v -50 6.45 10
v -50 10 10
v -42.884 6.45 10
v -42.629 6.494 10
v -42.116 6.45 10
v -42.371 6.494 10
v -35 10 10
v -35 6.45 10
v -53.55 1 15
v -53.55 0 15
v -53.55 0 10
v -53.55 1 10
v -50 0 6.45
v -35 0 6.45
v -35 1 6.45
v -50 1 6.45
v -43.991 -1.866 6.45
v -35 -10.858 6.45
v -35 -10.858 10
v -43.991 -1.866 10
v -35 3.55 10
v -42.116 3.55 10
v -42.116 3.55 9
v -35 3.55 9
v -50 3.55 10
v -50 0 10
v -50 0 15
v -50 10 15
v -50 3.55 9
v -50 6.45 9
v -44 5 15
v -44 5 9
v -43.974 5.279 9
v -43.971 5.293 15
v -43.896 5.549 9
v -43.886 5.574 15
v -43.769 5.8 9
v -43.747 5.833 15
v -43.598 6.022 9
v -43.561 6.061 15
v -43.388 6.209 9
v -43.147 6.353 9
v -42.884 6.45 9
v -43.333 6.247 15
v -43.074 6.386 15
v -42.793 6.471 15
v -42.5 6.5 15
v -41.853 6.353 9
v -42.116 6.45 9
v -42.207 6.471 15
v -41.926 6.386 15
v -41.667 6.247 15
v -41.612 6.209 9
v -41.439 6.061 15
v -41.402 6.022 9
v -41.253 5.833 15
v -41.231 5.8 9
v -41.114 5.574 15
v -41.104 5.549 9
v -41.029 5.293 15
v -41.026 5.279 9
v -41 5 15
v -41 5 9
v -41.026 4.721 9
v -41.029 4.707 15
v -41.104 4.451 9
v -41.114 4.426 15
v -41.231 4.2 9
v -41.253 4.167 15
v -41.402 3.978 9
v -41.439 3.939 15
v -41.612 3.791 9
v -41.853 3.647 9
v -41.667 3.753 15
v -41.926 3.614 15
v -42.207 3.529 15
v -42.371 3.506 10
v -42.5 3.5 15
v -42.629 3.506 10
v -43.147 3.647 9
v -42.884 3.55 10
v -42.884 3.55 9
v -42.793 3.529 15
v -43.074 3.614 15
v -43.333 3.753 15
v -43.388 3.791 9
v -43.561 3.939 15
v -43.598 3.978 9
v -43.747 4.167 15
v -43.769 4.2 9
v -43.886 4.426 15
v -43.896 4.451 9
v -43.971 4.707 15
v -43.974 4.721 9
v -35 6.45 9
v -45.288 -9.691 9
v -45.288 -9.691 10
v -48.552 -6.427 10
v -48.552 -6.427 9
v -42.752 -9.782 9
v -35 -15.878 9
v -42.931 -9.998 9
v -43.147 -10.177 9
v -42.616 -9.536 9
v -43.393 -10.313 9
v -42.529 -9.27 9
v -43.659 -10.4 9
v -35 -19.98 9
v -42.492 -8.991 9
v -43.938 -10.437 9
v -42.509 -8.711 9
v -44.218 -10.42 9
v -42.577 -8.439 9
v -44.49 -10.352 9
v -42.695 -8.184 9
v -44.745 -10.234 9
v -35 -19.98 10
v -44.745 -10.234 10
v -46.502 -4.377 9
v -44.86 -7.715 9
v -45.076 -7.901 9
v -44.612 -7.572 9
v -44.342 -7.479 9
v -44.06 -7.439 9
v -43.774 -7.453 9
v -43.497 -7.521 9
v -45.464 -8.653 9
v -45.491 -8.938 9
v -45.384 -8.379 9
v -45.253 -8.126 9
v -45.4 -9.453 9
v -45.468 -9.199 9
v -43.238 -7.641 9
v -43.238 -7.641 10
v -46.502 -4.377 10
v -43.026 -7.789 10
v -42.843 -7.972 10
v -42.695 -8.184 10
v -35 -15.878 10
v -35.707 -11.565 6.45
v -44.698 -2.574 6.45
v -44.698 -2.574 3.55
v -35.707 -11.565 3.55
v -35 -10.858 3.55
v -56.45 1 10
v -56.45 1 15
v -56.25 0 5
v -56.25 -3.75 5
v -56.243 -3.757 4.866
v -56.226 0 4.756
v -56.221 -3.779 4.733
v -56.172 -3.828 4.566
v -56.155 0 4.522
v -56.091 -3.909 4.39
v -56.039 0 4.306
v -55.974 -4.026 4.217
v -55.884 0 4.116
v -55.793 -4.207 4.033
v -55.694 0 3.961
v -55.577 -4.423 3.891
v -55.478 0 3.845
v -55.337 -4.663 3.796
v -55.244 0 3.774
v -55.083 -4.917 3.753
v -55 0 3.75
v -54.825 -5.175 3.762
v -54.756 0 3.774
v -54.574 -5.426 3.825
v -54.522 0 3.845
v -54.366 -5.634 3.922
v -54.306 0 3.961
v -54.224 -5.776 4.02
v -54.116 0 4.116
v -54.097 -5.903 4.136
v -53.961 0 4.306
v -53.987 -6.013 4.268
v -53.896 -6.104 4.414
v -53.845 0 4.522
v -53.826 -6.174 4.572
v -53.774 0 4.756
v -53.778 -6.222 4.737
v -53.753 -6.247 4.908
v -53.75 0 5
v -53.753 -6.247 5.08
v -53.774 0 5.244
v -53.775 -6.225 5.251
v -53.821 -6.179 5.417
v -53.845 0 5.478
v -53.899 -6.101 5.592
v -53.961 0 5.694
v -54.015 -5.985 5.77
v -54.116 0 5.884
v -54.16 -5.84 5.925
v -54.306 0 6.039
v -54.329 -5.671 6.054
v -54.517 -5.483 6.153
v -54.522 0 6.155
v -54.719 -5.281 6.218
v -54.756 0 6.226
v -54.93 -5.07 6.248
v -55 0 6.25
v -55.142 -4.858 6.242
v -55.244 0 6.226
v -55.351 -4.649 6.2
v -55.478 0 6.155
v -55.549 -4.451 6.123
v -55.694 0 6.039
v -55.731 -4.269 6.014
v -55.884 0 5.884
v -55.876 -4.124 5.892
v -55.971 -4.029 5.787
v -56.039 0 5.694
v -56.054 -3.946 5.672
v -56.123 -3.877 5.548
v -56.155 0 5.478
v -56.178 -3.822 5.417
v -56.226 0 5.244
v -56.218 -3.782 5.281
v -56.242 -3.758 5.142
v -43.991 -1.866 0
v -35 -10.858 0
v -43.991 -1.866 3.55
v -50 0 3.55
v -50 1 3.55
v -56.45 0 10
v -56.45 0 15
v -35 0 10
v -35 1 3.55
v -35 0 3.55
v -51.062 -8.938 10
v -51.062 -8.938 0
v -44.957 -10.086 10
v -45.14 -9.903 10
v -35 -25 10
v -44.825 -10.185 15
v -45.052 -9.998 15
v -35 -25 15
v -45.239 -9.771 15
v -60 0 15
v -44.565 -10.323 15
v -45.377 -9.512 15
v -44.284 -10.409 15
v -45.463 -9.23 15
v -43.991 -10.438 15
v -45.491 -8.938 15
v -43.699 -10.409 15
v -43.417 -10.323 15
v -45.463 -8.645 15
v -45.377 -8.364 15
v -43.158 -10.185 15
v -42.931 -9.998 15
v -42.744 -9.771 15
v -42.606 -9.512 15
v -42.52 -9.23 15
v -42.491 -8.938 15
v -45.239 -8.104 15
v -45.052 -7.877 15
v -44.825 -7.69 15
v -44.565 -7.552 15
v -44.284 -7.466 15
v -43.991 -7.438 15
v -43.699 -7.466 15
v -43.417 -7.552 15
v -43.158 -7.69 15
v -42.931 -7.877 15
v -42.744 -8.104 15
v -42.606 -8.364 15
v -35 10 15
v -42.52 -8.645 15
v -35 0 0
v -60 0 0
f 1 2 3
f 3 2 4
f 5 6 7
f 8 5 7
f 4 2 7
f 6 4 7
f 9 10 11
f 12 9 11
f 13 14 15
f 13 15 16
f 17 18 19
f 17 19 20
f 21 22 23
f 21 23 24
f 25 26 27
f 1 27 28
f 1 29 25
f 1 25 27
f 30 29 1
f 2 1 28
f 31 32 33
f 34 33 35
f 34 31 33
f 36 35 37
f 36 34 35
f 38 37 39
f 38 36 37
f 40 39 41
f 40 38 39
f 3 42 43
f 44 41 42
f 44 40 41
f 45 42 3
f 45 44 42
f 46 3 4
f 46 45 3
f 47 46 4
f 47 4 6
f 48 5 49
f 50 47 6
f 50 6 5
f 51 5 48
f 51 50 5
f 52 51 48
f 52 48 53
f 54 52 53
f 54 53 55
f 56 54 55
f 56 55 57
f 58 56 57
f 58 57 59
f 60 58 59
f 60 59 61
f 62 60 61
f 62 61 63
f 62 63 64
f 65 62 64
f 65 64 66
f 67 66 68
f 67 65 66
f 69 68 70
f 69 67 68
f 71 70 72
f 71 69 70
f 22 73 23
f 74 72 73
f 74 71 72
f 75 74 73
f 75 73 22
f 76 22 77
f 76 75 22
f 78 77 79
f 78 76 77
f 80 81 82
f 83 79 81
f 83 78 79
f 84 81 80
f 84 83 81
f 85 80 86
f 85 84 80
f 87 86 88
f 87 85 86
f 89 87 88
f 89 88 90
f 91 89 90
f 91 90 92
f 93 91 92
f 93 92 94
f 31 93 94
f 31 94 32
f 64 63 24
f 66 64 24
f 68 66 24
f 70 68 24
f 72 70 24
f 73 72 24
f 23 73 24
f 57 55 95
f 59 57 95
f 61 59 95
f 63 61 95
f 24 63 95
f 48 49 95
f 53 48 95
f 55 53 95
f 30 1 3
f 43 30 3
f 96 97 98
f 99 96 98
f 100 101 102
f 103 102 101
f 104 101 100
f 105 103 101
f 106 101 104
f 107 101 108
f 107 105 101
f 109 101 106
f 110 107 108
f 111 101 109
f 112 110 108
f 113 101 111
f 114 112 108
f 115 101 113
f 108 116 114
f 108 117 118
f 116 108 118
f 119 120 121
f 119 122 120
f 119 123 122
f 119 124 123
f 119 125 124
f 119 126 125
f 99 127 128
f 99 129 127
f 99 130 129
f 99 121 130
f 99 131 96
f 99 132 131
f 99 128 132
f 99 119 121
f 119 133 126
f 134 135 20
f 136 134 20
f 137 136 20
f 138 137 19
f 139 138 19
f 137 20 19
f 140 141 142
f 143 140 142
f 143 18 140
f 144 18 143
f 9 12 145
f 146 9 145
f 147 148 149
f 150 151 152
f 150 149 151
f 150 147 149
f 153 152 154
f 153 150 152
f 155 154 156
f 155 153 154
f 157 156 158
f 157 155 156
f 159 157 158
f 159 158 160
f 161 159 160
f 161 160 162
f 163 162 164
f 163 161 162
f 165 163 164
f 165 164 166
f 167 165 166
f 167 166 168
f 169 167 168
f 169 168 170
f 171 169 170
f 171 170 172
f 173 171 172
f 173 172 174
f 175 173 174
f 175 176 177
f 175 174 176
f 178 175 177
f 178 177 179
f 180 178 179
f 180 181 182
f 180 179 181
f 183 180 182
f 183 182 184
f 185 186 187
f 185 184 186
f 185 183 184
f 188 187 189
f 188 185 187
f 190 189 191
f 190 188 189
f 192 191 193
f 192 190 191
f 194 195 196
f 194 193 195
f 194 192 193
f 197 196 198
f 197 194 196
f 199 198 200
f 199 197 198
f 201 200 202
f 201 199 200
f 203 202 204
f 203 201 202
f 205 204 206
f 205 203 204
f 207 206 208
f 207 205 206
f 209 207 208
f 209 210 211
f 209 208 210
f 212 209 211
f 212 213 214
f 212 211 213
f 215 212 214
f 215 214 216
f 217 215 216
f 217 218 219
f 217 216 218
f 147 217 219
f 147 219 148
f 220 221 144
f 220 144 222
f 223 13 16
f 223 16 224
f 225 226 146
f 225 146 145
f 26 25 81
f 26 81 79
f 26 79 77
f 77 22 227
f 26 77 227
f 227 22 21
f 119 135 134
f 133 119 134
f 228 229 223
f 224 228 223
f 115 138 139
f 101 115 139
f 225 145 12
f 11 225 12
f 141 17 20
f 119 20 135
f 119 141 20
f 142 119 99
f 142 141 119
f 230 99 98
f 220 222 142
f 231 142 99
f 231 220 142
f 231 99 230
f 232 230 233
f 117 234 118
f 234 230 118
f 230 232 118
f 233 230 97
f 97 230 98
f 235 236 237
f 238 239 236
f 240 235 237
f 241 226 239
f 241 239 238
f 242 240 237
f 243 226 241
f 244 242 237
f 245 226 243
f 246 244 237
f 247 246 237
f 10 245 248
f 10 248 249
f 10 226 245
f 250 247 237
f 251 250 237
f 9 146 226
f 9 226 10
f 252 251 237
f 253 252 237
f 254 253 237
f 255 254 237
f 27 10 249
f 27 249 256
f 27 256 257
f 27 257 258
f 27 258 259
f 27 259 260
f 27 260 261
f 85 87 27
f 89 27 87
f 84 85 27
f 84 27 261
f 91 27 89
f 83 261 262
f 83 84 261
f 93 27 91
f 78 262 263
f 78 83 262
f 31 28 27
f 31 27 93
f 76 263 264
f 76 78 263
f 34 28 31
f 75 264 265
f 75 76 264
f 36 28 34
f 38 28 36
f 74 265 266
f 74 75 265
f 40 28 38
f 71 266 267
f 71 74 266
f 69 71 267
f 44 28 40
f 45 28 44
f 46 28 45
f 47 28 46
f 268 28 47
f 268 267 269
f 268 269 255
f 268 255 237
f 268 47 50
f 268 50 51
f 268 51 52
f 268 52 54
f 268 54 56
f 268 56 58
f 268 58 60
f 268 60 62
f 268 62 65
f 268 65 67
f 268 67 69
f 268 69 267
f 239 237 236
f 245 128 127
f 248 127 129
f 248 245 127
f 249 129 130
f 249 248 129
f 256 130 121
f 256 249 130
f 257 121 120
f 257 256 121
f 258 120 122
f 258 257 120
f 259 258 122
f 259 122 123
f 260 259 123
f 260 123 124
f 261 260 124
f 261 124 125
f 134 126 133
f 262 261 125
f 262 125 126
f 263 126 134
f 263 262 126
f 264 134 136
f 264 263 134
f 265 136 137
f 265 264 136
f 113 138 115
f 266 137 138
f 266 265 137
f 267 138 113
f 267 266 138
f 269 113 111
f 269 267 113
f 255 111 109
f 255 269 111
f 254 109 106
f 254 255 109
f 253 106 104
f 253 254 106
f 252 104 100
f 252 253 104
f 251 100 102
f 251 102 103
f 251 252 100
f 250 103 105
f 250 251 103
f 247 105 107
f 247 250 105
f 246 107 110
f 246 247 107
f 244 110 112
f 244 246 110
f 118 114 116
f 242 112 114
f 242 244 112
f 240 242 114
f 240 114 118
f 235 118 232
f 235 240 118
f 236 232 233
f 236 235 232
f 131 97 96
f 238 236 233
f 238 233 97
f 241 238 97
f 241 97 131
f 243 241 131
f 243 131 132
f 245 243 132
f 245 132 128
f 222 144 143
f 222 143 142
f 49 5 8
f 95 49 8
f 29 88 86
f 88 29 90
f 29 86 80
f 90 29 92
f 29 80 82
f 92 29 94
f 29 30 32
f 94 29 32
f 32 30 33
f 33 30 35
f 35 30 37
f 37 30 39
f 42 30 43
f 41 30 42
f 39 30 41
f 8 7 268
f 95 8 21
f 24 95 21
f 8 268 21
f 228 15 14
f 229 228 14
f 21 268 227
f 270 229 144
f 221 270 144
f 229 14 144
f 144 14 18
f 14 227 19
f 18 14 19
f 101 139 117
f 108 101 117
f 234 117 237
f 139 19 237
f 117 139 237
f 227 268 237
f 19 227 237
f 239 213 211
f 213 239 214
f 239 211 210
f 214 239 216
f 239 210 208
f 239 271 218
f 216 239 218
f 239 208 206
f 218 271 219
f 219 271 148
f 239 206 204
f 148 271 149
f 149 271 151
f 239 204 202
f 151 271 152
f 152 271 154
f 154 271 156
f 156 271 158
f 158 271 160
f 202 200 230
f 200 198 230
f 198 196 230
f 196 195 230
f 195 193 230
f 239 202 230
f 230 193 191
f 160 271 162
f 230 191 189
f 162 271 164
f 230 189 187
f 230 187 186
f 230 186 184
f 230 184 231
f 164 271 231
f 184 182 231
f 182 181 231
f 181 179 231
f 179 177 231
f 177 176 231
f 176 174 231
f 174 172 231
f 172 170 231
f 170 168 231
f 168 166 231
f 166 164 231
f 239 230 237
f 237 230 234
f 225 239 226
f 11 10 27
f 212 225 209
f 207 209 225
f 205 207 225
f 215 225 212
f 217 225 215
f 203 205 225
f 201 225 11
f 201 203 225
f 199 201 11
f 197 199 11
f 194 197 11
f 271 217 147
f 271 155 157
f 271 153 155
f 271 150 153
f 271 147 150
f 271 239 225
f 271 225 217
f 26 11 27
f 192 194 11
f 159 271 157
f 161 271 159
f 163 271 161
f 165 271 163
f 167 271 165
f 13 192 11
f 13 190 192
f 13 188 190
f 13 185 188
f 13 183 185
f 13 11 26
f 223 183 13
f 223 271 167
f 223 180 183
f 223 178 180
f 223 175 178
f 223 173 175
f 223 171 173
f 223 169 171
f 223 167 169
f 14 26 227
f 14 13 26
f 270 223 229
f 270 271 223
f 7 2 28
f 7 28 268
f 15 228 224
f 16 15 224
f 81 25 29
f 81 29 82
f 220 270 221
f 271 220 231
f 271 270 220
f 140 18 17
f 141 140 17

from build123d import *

# Parameters (mm, degrees)
MAIN_DEPTH          = 15
SKETCH4_W           = 15
SKETCH4_H           = 10
CUT_EXTRUDE2_DEPTH  = 10
SKETCH2_W           = 15
SKETCH2_H           = 2.9
BOSS_EXTRUDE3_DEPTH = 1
SKETCH5_W           = 2.9
SKETCH5_H           = 12.715728752
BOSS_EXTRUDE4_DEPTH = 1
SKETCH6_R           = 1.5
BOSS_EXTRUDE5_DEPTH = 5
BOSS_EXTRUDE6_DEPTH = 1
SKETCH8_W           = 2.9
SKETCH8_H           = 10
BOSS_EXTRUDE7_DEPTH = 1
SKETCH9_W           = 1
SKETCH9_H           = 2.9
BOSS_EXTRUDE8_DEPTH = 10
SKETCH11_R          = 1.25
CUT_EXTRUDE4_DEPTH  = 26
SKETCH12_R          = 1.5
CUT_EXTRUDE5_DEPTH  = 16
SKETCH13_W          = 15
SKETCH13_H          = 2.9
BOSS_EXTRUDE9_DEPTH = 1
SKETCH15_W          = 10
SKETCH15_H          = 10
CUT_EXTRUDE7_DEPTH  = 11
SKETCH16_R          = 1.5
CUT_EXTRUDE8_DEPTH  = 16
SKETCH14_W          = 30.791050847
SKETCH14_H          = 42.890305085
CUT_EXTRUDE6_DEPTH  = 26


with BuildPart() as part:
    # Sketch1 → Main (new body)
    with BuildSketch(Plane.XY):
        Polygon((0, 0), (-10, 0), (-10, 10), (-25, 10), (-25, -10.857864376), (-16.008621971, -1.866486348), (-8.937554159, -8.937554159), align=None)
    extrude(amount=MAIN_DEPTH)

    # Sketch4 → Cut-Extrude2 (cut)
    with BuildSketch(Plane(origin=(0, 0, 0), x_dir=(-1, 0, 0), z_dir=(0, 0, -1))):
        with Locations((17.5, 5)):
            Rectangle(SKETCH4_W, SKETCH4_H)
    extrude(amount=-CUT_EXTRUDE2_DEPTH, mode=Mode.SUBTRACT)

    # Sketch2 → Boss-Extrude3 (add)
    with BuildSketch(Plane(origin=(0, 0, 10), x_dir=(-1, 0, 0), z_dir=(0, 0, -1))):
        with Locations((17.5, 5)):
            Rectangle(SKETCH2_W, SKETCH2_H)
    extrude(amount=BOSS_EXTRUDE3_DEPTH)

    # Sketch5 → Boss-Extrude4 (add)
    with BuildSketch(Plane(origin=(-7.071067812, 7.071067812, 0), x_dir=(0, 0, -1), z_dir=(0.707106781, -0.707106781, 0))):
        with Locations((-5, -18.997474683)):
            Rectangle(SKETCH5_W, SKETCH5_H)
    extrude(amount=BOSS_EXTRUDE4_DEPTH)

    # Sketch6 → Boss-Extrude5 (add)
    with BuildSketch(Plane.XY.offset(10)):
        Polygon((-25, -10.857864376), (-16.008621971, -1.866486348), (-8.937554159, -8.937554159), (-25, -25), align=None)
        with Locations((-16.008621971, -8.937554159)):
            Circle(SKETCH6_R, mode=Mode.SUBTRACT)
    extrude(amount=BOSS_EXTRUDE5_DEPTH)

    # Sketch7 → Boss-Extrude6 (add)
    with BuildSketch(Plane(origin=(0, 0, 10), x_dir=(-1, 0, 0), z_dir=(0, 0, -1))):
        Polygon((13.498392898, -4.376715421), (25, -15.878322523), (25, -19.979541854), (11.447783233, -6.427325086), align=None)
    extrude(amount=BOSS_EXTRUDE6_DEPTH)

    # Sketch8 → Boss-Extrude7 (add)
    with BuildSketch(Plane(origin=(0, 0, 0), x_dir=(1, 0, 0), z_dir=(0, 1, 0))):
        with Locations((-5, -10)):
            Rectangle(SKETCH8_W, SKETCH8_H)
    extrude(amount=BOSS_EXTRUDE7_DEPTH)

    # Sketch11 → Cut-Extrude4 (cut, through all)
    with BuildSketch(Plane(origin=(0, 0, 0), x_dir=(1, 0, 0), z_dir=(0, 1, 0))):
        with Locations((-5, -5)):
            Circle(SKETCH11_R)
    extrude(amount=-CUT_EXTRUDE4_DEPTH, mode=Mode.SUBTRACT)

    # Sketch12 → Cut-Extrude5 (cut, through all)
    with BuildSketch(Plane.XY.offset(15)):
        with Locations((-16.008621971, -8.937554159)):
            Circle(SKETCH12_R)
    extrude(amount=-CUT_EXTRUDE5_DEPTH, mode=Mode.SUBTRACT)

    # Sketch13 → Boss-Extrude9 (add)
    with BuildSketch(Plane(origin=(0, 0, 0), x_dir=(1, 0, 0), z_dir=(0, 1, 0))):
        with Locations((-17.5, -5)):
            Rectangle(SKETCH13_W, SKETCH13_H)
    extrude(amount=BOSS_EXTRUDE9_DEPTH)


with BuildPart() as body_2:
    # Sketch9 → Boss-Extrude8 (new body)
    with BuildSketch(Plane.XY.offset(15)):
        with Locations((-9.5, 5)):
            Rectangle(SKETCH9_W, SKETCH9_H)
    extrude(amount=-BOSS_EXTRUDE8_DEPTH)


with BuildPart() as cut_extrude7_tool:
    # Sketch15 → Cut-Extrude7 (new body, through all)
    with BuildSketch(Plane(origin=(0, 0, 10), x_dir=(-1, 0, 0), z_dir=(0, 0, -1))):
        with Locations((5, 5)):
            Rectangle(SKETCH15_W, SKETCH15_H)
    extrude(amount=CUT_EXTRUDE7_DEPTH)


with BuildPart() as part_1:
    add(part.part)

    # Cut-Extrude7: cut by cut_extrude7_tool
    add(cut_extrude7_tool.part, mode=Mode.SUBTRACT)

    # Sketch16 → Cut-Extrude8 (cut, through all)
    with BuildSketch(Plane.XY.offset(15)):
        with Locations((-17.5, 5)):
            Circle(SKETCH16_R)
    extrude(amount=-CUT_EXTRUDE8_DEPTH, mode=Mode.SUBTRACT)


with BuildPart() as body_2_1:
    add(body_2.part)

    # Cut-Extrude7: cut by cut_extrude7_tool
    add(cut_extrude7_tool.part, mode=Mode.SUBTRACT)


with BuildPart() as body_3:
    # Mirror1: mirrored copy
    add(part_1.part.mirror(Plane.ZY.offset(30)))


with BuildPart() as cut_extrude6_tool:
    # Sketch14 → Cut-Extrude6 (new body, through all)
    with BuildSketch(Plane(origin=(-25, 0, -10), x_dir=(0, 0, -1), z_dir=(1, 0, 0))):
        with Locations((-11.471050848, -6.763186441)):
            Rectangle(SKETCH14_W, SKETCH14_H)
    extrude(amount=CUT_EXTRUDE6_DEPTH)


with BuildPart() as part_2:
    add(part_1.part)

    # Cut-Extrude6: cut by cut_extrude6_tool
    add(cut_extrude6_tool.part, mode=Mode.SUBTRACT)


with BuildPart() as body_2_2:
    add(body_2_1.part)

    # Cut-Extrude6: cut by cut_extrude6_tool
    add(cut_extrude6_tool.part, mode=Mode.SUBTRACT)


solid = body_3.part
